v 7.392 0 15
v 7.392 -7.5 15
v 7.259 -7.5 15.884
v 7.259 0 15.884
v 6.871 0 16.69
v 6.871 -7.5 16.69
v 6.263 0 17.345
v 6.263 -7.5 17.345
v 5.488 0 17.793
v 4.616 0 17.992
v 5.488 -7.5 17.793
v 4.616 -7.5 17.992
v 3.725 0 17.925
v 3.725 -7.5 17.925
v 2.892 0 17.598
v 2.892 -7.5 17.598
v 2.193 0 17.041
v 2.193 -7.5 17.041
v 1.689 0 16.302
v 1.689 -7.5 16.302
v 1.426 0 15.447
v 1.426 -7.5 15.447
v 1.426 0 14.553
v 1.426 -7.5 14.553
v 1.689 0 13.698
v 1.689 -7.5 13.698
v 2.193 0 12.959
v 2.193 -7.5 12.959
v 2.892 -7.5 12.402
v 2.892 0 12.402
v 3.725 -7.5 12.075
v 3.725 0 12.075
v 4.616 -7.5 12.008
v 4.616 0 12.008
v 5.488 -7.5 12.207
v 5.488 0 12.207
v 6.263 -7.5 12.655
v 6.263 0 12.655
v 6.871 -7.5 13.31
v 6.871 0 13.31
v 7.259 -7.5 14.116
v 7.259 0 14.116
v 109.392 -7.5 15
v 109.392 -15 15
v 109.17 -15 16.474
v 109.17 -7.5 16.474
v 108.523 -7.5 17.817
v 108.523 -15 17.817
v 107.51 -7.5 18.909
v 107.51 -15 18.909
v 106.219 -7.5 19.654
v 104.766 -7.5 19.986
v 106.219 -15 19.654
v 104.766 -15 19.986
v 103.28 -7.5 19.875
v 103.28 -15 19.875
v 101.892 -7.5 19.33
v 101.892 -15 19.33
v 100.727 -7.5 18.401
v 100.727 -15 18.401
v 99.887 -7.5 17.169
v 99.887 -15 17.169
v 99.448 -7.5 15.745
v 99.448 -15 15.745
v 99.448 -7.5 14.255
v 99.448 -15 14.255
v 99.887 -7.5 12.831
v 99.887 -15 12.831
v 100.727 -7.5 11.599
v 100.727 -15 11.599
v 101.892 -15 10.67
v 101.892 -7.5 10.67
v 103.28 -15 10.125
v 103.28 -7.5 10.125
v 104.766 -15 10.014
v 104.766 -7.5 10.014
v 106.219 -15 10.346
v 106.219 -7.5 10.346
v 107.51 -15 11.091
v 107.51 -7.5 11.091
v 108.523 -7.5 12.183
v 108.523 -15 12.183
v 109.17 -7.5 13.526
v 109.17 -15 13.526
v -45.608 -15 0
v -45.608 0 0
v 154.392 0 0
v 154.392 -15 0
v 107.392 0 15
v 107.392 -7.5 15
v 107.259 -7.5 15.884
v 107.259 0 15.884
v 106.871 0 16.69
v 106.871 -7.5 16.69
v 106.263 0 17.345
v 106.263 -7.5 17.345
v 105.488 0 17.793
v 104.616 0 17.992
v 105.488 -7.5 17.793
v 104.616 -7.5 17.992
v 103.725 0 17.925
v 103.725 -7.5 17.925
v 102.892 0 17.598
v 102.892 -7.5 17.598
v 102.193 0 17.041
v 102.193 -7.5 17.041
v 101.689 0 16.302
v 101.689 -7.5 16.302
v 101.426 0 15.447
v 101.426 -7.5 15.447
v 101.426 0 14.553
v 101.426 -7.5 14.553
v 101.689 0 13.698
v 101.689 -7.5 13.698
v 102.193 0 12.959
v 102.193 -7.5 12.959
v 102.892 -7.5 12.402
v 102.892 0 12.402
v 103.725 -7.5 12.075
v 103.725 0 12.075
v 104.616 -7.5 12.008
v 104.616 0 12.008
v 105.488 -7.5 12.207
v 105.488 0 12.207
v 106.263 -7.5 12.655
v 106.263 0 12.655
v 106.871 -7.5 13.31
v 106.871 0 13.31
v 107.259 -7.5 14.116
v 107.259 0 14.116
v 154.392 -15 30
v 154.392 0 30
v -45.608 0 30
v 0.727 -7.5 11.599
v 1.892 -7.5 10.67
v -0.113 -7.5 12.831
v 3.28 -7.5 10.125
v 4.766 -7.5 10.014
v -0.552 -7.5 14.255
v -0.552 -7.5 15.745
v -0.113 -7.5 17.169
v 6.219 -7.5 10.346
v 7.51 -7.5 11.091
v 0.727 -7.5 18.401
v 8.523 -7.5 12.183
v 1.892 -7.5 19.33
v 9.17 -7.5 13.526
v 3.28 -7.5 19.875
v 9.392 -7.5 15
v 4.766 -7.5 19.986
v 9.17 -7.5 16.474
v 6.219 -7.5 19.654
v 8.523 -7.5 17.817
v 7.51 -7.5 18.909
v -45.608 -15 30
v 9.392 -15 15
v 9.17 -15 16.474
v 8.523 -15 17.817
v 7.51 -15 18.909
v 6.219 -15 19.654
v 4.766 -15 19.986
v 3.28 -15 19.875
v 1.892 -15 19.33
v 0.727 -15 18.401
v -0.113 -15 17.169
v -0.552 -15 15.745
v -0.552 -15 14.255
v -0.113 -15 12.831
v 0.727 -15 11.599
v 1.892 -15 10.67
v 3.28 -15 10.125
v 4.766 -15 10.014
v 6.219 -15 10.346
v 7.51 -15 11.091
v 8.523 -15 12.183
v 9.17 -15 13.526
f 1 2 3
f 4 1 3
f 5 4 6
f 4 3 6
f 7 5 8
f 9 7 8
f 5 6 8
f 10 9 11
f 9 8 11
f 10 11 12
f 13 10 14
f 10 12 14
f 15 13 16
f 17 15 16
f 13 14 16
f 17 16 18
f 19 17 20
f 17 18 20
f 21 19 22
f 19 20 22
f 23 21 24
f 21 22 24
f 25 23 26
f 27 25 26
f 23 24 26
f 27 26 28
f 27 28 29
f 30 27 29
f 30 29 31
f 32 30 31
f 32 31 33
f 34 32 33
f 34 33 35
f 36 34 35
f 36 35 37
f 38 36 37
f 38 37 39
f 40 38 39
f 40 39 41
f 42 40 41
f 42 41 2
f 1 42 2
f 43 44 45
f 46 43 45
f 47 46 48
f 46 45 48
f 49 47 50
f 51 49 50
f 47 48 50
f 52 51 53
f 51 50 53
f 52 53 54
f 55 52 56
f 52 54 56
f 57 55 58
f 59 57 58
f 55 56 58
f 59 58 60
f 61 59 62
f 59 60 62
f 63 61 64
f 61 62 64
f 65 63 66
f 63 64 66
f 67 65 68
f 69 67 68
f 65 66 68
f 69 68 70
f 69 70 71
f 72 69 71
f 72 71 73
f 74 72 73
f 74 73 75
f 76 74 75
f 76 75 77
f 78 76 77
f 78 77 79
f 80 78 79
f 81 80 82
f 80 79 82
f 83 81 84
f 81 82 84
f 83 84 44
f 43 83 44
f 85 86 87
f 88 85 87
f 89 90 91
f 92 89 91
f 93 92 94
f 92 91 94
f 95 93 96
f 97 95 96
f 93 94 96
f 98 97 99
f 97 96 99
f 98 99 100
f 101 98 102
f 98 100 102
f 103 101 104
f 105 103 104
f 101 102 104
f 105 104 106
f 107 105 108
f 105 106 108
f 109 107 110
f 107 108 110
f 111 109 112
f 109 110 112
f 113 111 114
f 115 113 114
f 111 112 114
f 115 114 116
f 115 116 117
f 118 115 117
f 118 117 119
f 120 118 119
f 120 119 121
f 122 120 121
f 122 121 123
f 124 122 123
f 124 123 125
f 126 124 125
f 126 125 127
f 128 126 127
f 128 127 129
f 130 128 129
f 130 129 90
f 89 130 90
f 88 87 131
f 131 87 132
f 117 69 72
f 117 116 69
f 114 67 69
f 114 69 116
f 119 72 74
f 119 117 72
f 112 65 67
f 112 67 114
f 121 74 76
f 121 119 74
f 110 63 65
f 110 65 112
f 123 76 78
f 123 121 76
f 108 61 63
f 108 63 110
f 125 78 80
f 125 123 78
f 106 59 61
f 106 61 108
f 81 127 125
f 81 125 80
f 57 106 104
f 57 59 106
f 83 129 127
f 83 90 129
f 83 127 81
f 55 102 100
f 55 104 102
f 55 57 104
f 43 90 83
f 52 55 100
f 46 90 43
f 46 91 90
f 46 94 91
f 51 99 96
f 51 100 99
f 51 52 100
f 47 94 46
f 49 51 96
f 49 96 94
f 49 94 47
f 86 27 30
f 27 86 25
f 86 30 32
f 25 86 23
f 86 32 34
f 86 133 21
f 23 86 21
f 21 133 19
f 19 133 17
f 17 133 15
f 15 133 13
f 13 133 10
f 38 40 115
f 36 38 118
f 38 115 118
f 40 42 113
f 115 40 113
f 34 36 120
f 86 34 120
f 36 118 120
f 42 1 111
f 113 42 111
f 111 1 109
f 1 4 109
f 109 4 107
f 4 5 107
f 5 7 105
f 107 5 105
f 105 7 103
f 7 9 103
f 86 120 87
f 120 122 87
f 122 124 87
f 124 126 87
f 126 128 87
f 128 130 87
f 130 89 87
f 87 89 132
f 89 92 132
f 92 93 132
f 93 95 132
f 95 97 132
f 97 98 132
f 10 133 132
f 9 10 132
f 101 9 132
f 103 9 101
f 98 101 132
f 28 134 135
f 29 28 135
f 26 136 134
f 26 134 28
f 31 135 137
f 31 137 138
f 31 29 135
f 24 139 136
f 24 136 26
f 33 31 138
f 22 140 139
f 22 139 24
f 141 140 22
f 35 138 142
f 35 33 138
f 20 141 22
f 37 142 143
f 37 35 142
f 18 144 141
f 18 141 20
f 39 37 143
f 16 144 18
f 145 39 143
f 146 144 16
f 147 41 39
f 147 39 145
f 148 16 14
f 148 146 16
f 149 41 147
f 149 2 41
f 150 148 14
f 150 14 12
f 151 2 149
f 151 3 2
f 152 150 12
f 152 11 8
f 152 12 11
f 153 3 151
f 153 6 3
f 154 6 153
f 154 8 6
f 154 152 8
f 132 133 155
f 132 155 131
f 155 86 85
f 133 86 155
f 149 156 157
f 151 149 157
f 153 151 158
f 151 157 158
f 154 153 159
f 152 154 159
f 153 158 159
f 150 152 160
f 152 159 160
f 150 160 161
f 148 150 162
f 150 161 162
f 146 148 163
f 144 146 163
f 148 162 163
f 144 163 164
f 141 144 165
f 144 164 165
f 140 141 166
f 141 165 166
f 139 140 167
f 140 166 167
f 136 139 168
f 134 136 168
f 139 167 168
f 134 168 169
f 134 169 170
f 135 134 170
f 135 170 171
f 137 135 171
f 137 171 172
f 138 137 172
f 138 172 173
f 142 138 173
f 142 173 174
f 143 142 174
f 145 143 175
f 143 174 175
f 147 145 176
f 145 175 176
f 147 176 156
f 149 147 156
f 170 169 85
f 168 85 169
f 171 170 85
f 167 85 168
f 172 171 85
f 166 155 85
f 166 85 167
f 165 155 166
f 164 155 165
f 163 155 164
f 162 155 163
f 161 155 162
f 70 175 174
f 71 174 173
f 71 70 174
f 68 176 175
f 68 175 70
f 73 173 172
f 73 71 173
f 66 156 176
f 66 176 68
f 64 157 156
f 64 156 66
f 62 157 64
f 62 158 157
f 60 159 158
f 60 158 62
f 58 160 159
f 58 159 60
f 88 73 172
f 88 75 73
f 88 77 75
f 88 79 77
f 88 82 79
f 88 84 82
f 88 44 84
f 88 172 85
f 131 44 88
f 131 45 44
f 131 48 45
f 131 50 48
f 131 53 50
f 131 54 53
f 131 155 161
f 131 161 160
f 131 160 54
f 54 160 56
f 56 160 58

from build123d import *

# Parameters (mm, degrees)
F0_W     = 200
F0_H     = 30
F1_DEPTH = 15
F2_R     = 3
F3_DEPTH = 25
F2_R_2   = 5
F4_DEPTH = 7.5


with BuildPart() as f1:
    # F0 (on Front) → F1 (new body)
    with BuildSketch(Plane.XZ):
        with Locations((54.39228, 15)):
            Rectangle(F0_W, F0_H)
    extrude(amount=F1_DEPTH)

    # F2 (on face) → F3 (cut)
    with BuildSketch(Plane.XZ.offset(15)):
        with Locations((4.39228, 15)):
            Circle(F2_R)
        with Locations((104.39228, 15)):
            Circle(F2_R)
    extrude(amount=-F3_DEPTH, mode=Mode.SUBTRACT)

    # F2 (on face) → F4 (cut)
    with BuildSketch(Plane.XZ.offset(15)):
        with Locations((4.39228, 15)):
            Circle(F2_R_2)
        with Locations((4.39228, 15)):
            Circle(F2_R, mode=Mode.SUBTRACT)
        with Locations((104.39228, 15)):
            Circle(F2_R_2)
        with Locations((104.39228, 15)):
            Circle(F2_R, mode=Mode.SUBTRACT)
    extrude(amount=-F4_DEPTH, mode=Mode.SUBTRACT)


solid = f1.part
